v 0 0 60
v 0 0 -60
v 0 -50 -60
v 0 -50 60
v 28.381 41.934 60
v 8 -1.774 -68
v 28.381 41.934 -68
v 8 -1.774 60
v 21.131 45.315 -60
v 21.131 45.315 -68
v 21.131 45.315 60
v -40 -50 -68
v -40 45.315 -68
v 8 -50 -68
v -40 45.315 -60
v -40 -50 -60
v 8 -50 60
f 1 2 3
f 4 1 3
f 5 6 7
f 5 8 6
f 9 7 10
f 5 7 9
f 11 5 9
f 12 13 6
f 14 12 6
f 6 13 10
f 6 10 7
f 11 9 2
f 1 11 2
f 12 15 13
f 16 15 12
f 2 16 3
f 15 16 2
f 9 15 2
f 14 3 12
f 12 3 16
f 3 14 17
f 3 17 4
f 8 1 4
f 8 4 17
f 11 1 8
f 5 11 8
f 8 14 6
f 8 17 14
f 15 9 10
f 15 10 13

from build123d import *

# Parameters (mm, degrees)
BRKT_4_5_BOSS_EXTRUDE1_START = -60
BRKT_4_5_BOSS_EXTRUDE1_DEPTH = 120
BOSS_EXTRUDE1_DEPTH          = 8


# Read off the part's stored shape, not the designer's step: <BRKT_4_5>-<Boss-Extrude1>
with BuildPart() as part:
    # <BRKT_4_5>-<Boss-Extrude1> outline → <BRKT_4_5>-<Boss-Extrude1> (new body)
    with BuildSketch(Plane.XY.offset(BRKT_4_5_BOSS_EXTRUDE1_START)):
        Polygon((0, 0), (0, -50), (8, -50), (8, -1.773557301), (28.381375383, 41.934443258), (21.130913087, 45.315389352), align=None)
    extrude(amount=BRKT_4_5_BOSS_EXTRUDE1_DEPTH)

    # Sketch1 → Boss-Extrude1 (add)
    with BuildSketch(Plane(origin=(0, 0, -60), x_dir=(-1, 0, 0), z_dir=(0, 0, -1))):
        Polygon((-28.381375383, 41.934443258), (-21.130913087, 45.315389352), (40, 45.315389352), (40, -50), (0, -50), (-8, -50), (-8, -1.773557301), align=None)
    extrude(amount=BOSS_EXTRUDE1_DEPTH)


solid = part.part
